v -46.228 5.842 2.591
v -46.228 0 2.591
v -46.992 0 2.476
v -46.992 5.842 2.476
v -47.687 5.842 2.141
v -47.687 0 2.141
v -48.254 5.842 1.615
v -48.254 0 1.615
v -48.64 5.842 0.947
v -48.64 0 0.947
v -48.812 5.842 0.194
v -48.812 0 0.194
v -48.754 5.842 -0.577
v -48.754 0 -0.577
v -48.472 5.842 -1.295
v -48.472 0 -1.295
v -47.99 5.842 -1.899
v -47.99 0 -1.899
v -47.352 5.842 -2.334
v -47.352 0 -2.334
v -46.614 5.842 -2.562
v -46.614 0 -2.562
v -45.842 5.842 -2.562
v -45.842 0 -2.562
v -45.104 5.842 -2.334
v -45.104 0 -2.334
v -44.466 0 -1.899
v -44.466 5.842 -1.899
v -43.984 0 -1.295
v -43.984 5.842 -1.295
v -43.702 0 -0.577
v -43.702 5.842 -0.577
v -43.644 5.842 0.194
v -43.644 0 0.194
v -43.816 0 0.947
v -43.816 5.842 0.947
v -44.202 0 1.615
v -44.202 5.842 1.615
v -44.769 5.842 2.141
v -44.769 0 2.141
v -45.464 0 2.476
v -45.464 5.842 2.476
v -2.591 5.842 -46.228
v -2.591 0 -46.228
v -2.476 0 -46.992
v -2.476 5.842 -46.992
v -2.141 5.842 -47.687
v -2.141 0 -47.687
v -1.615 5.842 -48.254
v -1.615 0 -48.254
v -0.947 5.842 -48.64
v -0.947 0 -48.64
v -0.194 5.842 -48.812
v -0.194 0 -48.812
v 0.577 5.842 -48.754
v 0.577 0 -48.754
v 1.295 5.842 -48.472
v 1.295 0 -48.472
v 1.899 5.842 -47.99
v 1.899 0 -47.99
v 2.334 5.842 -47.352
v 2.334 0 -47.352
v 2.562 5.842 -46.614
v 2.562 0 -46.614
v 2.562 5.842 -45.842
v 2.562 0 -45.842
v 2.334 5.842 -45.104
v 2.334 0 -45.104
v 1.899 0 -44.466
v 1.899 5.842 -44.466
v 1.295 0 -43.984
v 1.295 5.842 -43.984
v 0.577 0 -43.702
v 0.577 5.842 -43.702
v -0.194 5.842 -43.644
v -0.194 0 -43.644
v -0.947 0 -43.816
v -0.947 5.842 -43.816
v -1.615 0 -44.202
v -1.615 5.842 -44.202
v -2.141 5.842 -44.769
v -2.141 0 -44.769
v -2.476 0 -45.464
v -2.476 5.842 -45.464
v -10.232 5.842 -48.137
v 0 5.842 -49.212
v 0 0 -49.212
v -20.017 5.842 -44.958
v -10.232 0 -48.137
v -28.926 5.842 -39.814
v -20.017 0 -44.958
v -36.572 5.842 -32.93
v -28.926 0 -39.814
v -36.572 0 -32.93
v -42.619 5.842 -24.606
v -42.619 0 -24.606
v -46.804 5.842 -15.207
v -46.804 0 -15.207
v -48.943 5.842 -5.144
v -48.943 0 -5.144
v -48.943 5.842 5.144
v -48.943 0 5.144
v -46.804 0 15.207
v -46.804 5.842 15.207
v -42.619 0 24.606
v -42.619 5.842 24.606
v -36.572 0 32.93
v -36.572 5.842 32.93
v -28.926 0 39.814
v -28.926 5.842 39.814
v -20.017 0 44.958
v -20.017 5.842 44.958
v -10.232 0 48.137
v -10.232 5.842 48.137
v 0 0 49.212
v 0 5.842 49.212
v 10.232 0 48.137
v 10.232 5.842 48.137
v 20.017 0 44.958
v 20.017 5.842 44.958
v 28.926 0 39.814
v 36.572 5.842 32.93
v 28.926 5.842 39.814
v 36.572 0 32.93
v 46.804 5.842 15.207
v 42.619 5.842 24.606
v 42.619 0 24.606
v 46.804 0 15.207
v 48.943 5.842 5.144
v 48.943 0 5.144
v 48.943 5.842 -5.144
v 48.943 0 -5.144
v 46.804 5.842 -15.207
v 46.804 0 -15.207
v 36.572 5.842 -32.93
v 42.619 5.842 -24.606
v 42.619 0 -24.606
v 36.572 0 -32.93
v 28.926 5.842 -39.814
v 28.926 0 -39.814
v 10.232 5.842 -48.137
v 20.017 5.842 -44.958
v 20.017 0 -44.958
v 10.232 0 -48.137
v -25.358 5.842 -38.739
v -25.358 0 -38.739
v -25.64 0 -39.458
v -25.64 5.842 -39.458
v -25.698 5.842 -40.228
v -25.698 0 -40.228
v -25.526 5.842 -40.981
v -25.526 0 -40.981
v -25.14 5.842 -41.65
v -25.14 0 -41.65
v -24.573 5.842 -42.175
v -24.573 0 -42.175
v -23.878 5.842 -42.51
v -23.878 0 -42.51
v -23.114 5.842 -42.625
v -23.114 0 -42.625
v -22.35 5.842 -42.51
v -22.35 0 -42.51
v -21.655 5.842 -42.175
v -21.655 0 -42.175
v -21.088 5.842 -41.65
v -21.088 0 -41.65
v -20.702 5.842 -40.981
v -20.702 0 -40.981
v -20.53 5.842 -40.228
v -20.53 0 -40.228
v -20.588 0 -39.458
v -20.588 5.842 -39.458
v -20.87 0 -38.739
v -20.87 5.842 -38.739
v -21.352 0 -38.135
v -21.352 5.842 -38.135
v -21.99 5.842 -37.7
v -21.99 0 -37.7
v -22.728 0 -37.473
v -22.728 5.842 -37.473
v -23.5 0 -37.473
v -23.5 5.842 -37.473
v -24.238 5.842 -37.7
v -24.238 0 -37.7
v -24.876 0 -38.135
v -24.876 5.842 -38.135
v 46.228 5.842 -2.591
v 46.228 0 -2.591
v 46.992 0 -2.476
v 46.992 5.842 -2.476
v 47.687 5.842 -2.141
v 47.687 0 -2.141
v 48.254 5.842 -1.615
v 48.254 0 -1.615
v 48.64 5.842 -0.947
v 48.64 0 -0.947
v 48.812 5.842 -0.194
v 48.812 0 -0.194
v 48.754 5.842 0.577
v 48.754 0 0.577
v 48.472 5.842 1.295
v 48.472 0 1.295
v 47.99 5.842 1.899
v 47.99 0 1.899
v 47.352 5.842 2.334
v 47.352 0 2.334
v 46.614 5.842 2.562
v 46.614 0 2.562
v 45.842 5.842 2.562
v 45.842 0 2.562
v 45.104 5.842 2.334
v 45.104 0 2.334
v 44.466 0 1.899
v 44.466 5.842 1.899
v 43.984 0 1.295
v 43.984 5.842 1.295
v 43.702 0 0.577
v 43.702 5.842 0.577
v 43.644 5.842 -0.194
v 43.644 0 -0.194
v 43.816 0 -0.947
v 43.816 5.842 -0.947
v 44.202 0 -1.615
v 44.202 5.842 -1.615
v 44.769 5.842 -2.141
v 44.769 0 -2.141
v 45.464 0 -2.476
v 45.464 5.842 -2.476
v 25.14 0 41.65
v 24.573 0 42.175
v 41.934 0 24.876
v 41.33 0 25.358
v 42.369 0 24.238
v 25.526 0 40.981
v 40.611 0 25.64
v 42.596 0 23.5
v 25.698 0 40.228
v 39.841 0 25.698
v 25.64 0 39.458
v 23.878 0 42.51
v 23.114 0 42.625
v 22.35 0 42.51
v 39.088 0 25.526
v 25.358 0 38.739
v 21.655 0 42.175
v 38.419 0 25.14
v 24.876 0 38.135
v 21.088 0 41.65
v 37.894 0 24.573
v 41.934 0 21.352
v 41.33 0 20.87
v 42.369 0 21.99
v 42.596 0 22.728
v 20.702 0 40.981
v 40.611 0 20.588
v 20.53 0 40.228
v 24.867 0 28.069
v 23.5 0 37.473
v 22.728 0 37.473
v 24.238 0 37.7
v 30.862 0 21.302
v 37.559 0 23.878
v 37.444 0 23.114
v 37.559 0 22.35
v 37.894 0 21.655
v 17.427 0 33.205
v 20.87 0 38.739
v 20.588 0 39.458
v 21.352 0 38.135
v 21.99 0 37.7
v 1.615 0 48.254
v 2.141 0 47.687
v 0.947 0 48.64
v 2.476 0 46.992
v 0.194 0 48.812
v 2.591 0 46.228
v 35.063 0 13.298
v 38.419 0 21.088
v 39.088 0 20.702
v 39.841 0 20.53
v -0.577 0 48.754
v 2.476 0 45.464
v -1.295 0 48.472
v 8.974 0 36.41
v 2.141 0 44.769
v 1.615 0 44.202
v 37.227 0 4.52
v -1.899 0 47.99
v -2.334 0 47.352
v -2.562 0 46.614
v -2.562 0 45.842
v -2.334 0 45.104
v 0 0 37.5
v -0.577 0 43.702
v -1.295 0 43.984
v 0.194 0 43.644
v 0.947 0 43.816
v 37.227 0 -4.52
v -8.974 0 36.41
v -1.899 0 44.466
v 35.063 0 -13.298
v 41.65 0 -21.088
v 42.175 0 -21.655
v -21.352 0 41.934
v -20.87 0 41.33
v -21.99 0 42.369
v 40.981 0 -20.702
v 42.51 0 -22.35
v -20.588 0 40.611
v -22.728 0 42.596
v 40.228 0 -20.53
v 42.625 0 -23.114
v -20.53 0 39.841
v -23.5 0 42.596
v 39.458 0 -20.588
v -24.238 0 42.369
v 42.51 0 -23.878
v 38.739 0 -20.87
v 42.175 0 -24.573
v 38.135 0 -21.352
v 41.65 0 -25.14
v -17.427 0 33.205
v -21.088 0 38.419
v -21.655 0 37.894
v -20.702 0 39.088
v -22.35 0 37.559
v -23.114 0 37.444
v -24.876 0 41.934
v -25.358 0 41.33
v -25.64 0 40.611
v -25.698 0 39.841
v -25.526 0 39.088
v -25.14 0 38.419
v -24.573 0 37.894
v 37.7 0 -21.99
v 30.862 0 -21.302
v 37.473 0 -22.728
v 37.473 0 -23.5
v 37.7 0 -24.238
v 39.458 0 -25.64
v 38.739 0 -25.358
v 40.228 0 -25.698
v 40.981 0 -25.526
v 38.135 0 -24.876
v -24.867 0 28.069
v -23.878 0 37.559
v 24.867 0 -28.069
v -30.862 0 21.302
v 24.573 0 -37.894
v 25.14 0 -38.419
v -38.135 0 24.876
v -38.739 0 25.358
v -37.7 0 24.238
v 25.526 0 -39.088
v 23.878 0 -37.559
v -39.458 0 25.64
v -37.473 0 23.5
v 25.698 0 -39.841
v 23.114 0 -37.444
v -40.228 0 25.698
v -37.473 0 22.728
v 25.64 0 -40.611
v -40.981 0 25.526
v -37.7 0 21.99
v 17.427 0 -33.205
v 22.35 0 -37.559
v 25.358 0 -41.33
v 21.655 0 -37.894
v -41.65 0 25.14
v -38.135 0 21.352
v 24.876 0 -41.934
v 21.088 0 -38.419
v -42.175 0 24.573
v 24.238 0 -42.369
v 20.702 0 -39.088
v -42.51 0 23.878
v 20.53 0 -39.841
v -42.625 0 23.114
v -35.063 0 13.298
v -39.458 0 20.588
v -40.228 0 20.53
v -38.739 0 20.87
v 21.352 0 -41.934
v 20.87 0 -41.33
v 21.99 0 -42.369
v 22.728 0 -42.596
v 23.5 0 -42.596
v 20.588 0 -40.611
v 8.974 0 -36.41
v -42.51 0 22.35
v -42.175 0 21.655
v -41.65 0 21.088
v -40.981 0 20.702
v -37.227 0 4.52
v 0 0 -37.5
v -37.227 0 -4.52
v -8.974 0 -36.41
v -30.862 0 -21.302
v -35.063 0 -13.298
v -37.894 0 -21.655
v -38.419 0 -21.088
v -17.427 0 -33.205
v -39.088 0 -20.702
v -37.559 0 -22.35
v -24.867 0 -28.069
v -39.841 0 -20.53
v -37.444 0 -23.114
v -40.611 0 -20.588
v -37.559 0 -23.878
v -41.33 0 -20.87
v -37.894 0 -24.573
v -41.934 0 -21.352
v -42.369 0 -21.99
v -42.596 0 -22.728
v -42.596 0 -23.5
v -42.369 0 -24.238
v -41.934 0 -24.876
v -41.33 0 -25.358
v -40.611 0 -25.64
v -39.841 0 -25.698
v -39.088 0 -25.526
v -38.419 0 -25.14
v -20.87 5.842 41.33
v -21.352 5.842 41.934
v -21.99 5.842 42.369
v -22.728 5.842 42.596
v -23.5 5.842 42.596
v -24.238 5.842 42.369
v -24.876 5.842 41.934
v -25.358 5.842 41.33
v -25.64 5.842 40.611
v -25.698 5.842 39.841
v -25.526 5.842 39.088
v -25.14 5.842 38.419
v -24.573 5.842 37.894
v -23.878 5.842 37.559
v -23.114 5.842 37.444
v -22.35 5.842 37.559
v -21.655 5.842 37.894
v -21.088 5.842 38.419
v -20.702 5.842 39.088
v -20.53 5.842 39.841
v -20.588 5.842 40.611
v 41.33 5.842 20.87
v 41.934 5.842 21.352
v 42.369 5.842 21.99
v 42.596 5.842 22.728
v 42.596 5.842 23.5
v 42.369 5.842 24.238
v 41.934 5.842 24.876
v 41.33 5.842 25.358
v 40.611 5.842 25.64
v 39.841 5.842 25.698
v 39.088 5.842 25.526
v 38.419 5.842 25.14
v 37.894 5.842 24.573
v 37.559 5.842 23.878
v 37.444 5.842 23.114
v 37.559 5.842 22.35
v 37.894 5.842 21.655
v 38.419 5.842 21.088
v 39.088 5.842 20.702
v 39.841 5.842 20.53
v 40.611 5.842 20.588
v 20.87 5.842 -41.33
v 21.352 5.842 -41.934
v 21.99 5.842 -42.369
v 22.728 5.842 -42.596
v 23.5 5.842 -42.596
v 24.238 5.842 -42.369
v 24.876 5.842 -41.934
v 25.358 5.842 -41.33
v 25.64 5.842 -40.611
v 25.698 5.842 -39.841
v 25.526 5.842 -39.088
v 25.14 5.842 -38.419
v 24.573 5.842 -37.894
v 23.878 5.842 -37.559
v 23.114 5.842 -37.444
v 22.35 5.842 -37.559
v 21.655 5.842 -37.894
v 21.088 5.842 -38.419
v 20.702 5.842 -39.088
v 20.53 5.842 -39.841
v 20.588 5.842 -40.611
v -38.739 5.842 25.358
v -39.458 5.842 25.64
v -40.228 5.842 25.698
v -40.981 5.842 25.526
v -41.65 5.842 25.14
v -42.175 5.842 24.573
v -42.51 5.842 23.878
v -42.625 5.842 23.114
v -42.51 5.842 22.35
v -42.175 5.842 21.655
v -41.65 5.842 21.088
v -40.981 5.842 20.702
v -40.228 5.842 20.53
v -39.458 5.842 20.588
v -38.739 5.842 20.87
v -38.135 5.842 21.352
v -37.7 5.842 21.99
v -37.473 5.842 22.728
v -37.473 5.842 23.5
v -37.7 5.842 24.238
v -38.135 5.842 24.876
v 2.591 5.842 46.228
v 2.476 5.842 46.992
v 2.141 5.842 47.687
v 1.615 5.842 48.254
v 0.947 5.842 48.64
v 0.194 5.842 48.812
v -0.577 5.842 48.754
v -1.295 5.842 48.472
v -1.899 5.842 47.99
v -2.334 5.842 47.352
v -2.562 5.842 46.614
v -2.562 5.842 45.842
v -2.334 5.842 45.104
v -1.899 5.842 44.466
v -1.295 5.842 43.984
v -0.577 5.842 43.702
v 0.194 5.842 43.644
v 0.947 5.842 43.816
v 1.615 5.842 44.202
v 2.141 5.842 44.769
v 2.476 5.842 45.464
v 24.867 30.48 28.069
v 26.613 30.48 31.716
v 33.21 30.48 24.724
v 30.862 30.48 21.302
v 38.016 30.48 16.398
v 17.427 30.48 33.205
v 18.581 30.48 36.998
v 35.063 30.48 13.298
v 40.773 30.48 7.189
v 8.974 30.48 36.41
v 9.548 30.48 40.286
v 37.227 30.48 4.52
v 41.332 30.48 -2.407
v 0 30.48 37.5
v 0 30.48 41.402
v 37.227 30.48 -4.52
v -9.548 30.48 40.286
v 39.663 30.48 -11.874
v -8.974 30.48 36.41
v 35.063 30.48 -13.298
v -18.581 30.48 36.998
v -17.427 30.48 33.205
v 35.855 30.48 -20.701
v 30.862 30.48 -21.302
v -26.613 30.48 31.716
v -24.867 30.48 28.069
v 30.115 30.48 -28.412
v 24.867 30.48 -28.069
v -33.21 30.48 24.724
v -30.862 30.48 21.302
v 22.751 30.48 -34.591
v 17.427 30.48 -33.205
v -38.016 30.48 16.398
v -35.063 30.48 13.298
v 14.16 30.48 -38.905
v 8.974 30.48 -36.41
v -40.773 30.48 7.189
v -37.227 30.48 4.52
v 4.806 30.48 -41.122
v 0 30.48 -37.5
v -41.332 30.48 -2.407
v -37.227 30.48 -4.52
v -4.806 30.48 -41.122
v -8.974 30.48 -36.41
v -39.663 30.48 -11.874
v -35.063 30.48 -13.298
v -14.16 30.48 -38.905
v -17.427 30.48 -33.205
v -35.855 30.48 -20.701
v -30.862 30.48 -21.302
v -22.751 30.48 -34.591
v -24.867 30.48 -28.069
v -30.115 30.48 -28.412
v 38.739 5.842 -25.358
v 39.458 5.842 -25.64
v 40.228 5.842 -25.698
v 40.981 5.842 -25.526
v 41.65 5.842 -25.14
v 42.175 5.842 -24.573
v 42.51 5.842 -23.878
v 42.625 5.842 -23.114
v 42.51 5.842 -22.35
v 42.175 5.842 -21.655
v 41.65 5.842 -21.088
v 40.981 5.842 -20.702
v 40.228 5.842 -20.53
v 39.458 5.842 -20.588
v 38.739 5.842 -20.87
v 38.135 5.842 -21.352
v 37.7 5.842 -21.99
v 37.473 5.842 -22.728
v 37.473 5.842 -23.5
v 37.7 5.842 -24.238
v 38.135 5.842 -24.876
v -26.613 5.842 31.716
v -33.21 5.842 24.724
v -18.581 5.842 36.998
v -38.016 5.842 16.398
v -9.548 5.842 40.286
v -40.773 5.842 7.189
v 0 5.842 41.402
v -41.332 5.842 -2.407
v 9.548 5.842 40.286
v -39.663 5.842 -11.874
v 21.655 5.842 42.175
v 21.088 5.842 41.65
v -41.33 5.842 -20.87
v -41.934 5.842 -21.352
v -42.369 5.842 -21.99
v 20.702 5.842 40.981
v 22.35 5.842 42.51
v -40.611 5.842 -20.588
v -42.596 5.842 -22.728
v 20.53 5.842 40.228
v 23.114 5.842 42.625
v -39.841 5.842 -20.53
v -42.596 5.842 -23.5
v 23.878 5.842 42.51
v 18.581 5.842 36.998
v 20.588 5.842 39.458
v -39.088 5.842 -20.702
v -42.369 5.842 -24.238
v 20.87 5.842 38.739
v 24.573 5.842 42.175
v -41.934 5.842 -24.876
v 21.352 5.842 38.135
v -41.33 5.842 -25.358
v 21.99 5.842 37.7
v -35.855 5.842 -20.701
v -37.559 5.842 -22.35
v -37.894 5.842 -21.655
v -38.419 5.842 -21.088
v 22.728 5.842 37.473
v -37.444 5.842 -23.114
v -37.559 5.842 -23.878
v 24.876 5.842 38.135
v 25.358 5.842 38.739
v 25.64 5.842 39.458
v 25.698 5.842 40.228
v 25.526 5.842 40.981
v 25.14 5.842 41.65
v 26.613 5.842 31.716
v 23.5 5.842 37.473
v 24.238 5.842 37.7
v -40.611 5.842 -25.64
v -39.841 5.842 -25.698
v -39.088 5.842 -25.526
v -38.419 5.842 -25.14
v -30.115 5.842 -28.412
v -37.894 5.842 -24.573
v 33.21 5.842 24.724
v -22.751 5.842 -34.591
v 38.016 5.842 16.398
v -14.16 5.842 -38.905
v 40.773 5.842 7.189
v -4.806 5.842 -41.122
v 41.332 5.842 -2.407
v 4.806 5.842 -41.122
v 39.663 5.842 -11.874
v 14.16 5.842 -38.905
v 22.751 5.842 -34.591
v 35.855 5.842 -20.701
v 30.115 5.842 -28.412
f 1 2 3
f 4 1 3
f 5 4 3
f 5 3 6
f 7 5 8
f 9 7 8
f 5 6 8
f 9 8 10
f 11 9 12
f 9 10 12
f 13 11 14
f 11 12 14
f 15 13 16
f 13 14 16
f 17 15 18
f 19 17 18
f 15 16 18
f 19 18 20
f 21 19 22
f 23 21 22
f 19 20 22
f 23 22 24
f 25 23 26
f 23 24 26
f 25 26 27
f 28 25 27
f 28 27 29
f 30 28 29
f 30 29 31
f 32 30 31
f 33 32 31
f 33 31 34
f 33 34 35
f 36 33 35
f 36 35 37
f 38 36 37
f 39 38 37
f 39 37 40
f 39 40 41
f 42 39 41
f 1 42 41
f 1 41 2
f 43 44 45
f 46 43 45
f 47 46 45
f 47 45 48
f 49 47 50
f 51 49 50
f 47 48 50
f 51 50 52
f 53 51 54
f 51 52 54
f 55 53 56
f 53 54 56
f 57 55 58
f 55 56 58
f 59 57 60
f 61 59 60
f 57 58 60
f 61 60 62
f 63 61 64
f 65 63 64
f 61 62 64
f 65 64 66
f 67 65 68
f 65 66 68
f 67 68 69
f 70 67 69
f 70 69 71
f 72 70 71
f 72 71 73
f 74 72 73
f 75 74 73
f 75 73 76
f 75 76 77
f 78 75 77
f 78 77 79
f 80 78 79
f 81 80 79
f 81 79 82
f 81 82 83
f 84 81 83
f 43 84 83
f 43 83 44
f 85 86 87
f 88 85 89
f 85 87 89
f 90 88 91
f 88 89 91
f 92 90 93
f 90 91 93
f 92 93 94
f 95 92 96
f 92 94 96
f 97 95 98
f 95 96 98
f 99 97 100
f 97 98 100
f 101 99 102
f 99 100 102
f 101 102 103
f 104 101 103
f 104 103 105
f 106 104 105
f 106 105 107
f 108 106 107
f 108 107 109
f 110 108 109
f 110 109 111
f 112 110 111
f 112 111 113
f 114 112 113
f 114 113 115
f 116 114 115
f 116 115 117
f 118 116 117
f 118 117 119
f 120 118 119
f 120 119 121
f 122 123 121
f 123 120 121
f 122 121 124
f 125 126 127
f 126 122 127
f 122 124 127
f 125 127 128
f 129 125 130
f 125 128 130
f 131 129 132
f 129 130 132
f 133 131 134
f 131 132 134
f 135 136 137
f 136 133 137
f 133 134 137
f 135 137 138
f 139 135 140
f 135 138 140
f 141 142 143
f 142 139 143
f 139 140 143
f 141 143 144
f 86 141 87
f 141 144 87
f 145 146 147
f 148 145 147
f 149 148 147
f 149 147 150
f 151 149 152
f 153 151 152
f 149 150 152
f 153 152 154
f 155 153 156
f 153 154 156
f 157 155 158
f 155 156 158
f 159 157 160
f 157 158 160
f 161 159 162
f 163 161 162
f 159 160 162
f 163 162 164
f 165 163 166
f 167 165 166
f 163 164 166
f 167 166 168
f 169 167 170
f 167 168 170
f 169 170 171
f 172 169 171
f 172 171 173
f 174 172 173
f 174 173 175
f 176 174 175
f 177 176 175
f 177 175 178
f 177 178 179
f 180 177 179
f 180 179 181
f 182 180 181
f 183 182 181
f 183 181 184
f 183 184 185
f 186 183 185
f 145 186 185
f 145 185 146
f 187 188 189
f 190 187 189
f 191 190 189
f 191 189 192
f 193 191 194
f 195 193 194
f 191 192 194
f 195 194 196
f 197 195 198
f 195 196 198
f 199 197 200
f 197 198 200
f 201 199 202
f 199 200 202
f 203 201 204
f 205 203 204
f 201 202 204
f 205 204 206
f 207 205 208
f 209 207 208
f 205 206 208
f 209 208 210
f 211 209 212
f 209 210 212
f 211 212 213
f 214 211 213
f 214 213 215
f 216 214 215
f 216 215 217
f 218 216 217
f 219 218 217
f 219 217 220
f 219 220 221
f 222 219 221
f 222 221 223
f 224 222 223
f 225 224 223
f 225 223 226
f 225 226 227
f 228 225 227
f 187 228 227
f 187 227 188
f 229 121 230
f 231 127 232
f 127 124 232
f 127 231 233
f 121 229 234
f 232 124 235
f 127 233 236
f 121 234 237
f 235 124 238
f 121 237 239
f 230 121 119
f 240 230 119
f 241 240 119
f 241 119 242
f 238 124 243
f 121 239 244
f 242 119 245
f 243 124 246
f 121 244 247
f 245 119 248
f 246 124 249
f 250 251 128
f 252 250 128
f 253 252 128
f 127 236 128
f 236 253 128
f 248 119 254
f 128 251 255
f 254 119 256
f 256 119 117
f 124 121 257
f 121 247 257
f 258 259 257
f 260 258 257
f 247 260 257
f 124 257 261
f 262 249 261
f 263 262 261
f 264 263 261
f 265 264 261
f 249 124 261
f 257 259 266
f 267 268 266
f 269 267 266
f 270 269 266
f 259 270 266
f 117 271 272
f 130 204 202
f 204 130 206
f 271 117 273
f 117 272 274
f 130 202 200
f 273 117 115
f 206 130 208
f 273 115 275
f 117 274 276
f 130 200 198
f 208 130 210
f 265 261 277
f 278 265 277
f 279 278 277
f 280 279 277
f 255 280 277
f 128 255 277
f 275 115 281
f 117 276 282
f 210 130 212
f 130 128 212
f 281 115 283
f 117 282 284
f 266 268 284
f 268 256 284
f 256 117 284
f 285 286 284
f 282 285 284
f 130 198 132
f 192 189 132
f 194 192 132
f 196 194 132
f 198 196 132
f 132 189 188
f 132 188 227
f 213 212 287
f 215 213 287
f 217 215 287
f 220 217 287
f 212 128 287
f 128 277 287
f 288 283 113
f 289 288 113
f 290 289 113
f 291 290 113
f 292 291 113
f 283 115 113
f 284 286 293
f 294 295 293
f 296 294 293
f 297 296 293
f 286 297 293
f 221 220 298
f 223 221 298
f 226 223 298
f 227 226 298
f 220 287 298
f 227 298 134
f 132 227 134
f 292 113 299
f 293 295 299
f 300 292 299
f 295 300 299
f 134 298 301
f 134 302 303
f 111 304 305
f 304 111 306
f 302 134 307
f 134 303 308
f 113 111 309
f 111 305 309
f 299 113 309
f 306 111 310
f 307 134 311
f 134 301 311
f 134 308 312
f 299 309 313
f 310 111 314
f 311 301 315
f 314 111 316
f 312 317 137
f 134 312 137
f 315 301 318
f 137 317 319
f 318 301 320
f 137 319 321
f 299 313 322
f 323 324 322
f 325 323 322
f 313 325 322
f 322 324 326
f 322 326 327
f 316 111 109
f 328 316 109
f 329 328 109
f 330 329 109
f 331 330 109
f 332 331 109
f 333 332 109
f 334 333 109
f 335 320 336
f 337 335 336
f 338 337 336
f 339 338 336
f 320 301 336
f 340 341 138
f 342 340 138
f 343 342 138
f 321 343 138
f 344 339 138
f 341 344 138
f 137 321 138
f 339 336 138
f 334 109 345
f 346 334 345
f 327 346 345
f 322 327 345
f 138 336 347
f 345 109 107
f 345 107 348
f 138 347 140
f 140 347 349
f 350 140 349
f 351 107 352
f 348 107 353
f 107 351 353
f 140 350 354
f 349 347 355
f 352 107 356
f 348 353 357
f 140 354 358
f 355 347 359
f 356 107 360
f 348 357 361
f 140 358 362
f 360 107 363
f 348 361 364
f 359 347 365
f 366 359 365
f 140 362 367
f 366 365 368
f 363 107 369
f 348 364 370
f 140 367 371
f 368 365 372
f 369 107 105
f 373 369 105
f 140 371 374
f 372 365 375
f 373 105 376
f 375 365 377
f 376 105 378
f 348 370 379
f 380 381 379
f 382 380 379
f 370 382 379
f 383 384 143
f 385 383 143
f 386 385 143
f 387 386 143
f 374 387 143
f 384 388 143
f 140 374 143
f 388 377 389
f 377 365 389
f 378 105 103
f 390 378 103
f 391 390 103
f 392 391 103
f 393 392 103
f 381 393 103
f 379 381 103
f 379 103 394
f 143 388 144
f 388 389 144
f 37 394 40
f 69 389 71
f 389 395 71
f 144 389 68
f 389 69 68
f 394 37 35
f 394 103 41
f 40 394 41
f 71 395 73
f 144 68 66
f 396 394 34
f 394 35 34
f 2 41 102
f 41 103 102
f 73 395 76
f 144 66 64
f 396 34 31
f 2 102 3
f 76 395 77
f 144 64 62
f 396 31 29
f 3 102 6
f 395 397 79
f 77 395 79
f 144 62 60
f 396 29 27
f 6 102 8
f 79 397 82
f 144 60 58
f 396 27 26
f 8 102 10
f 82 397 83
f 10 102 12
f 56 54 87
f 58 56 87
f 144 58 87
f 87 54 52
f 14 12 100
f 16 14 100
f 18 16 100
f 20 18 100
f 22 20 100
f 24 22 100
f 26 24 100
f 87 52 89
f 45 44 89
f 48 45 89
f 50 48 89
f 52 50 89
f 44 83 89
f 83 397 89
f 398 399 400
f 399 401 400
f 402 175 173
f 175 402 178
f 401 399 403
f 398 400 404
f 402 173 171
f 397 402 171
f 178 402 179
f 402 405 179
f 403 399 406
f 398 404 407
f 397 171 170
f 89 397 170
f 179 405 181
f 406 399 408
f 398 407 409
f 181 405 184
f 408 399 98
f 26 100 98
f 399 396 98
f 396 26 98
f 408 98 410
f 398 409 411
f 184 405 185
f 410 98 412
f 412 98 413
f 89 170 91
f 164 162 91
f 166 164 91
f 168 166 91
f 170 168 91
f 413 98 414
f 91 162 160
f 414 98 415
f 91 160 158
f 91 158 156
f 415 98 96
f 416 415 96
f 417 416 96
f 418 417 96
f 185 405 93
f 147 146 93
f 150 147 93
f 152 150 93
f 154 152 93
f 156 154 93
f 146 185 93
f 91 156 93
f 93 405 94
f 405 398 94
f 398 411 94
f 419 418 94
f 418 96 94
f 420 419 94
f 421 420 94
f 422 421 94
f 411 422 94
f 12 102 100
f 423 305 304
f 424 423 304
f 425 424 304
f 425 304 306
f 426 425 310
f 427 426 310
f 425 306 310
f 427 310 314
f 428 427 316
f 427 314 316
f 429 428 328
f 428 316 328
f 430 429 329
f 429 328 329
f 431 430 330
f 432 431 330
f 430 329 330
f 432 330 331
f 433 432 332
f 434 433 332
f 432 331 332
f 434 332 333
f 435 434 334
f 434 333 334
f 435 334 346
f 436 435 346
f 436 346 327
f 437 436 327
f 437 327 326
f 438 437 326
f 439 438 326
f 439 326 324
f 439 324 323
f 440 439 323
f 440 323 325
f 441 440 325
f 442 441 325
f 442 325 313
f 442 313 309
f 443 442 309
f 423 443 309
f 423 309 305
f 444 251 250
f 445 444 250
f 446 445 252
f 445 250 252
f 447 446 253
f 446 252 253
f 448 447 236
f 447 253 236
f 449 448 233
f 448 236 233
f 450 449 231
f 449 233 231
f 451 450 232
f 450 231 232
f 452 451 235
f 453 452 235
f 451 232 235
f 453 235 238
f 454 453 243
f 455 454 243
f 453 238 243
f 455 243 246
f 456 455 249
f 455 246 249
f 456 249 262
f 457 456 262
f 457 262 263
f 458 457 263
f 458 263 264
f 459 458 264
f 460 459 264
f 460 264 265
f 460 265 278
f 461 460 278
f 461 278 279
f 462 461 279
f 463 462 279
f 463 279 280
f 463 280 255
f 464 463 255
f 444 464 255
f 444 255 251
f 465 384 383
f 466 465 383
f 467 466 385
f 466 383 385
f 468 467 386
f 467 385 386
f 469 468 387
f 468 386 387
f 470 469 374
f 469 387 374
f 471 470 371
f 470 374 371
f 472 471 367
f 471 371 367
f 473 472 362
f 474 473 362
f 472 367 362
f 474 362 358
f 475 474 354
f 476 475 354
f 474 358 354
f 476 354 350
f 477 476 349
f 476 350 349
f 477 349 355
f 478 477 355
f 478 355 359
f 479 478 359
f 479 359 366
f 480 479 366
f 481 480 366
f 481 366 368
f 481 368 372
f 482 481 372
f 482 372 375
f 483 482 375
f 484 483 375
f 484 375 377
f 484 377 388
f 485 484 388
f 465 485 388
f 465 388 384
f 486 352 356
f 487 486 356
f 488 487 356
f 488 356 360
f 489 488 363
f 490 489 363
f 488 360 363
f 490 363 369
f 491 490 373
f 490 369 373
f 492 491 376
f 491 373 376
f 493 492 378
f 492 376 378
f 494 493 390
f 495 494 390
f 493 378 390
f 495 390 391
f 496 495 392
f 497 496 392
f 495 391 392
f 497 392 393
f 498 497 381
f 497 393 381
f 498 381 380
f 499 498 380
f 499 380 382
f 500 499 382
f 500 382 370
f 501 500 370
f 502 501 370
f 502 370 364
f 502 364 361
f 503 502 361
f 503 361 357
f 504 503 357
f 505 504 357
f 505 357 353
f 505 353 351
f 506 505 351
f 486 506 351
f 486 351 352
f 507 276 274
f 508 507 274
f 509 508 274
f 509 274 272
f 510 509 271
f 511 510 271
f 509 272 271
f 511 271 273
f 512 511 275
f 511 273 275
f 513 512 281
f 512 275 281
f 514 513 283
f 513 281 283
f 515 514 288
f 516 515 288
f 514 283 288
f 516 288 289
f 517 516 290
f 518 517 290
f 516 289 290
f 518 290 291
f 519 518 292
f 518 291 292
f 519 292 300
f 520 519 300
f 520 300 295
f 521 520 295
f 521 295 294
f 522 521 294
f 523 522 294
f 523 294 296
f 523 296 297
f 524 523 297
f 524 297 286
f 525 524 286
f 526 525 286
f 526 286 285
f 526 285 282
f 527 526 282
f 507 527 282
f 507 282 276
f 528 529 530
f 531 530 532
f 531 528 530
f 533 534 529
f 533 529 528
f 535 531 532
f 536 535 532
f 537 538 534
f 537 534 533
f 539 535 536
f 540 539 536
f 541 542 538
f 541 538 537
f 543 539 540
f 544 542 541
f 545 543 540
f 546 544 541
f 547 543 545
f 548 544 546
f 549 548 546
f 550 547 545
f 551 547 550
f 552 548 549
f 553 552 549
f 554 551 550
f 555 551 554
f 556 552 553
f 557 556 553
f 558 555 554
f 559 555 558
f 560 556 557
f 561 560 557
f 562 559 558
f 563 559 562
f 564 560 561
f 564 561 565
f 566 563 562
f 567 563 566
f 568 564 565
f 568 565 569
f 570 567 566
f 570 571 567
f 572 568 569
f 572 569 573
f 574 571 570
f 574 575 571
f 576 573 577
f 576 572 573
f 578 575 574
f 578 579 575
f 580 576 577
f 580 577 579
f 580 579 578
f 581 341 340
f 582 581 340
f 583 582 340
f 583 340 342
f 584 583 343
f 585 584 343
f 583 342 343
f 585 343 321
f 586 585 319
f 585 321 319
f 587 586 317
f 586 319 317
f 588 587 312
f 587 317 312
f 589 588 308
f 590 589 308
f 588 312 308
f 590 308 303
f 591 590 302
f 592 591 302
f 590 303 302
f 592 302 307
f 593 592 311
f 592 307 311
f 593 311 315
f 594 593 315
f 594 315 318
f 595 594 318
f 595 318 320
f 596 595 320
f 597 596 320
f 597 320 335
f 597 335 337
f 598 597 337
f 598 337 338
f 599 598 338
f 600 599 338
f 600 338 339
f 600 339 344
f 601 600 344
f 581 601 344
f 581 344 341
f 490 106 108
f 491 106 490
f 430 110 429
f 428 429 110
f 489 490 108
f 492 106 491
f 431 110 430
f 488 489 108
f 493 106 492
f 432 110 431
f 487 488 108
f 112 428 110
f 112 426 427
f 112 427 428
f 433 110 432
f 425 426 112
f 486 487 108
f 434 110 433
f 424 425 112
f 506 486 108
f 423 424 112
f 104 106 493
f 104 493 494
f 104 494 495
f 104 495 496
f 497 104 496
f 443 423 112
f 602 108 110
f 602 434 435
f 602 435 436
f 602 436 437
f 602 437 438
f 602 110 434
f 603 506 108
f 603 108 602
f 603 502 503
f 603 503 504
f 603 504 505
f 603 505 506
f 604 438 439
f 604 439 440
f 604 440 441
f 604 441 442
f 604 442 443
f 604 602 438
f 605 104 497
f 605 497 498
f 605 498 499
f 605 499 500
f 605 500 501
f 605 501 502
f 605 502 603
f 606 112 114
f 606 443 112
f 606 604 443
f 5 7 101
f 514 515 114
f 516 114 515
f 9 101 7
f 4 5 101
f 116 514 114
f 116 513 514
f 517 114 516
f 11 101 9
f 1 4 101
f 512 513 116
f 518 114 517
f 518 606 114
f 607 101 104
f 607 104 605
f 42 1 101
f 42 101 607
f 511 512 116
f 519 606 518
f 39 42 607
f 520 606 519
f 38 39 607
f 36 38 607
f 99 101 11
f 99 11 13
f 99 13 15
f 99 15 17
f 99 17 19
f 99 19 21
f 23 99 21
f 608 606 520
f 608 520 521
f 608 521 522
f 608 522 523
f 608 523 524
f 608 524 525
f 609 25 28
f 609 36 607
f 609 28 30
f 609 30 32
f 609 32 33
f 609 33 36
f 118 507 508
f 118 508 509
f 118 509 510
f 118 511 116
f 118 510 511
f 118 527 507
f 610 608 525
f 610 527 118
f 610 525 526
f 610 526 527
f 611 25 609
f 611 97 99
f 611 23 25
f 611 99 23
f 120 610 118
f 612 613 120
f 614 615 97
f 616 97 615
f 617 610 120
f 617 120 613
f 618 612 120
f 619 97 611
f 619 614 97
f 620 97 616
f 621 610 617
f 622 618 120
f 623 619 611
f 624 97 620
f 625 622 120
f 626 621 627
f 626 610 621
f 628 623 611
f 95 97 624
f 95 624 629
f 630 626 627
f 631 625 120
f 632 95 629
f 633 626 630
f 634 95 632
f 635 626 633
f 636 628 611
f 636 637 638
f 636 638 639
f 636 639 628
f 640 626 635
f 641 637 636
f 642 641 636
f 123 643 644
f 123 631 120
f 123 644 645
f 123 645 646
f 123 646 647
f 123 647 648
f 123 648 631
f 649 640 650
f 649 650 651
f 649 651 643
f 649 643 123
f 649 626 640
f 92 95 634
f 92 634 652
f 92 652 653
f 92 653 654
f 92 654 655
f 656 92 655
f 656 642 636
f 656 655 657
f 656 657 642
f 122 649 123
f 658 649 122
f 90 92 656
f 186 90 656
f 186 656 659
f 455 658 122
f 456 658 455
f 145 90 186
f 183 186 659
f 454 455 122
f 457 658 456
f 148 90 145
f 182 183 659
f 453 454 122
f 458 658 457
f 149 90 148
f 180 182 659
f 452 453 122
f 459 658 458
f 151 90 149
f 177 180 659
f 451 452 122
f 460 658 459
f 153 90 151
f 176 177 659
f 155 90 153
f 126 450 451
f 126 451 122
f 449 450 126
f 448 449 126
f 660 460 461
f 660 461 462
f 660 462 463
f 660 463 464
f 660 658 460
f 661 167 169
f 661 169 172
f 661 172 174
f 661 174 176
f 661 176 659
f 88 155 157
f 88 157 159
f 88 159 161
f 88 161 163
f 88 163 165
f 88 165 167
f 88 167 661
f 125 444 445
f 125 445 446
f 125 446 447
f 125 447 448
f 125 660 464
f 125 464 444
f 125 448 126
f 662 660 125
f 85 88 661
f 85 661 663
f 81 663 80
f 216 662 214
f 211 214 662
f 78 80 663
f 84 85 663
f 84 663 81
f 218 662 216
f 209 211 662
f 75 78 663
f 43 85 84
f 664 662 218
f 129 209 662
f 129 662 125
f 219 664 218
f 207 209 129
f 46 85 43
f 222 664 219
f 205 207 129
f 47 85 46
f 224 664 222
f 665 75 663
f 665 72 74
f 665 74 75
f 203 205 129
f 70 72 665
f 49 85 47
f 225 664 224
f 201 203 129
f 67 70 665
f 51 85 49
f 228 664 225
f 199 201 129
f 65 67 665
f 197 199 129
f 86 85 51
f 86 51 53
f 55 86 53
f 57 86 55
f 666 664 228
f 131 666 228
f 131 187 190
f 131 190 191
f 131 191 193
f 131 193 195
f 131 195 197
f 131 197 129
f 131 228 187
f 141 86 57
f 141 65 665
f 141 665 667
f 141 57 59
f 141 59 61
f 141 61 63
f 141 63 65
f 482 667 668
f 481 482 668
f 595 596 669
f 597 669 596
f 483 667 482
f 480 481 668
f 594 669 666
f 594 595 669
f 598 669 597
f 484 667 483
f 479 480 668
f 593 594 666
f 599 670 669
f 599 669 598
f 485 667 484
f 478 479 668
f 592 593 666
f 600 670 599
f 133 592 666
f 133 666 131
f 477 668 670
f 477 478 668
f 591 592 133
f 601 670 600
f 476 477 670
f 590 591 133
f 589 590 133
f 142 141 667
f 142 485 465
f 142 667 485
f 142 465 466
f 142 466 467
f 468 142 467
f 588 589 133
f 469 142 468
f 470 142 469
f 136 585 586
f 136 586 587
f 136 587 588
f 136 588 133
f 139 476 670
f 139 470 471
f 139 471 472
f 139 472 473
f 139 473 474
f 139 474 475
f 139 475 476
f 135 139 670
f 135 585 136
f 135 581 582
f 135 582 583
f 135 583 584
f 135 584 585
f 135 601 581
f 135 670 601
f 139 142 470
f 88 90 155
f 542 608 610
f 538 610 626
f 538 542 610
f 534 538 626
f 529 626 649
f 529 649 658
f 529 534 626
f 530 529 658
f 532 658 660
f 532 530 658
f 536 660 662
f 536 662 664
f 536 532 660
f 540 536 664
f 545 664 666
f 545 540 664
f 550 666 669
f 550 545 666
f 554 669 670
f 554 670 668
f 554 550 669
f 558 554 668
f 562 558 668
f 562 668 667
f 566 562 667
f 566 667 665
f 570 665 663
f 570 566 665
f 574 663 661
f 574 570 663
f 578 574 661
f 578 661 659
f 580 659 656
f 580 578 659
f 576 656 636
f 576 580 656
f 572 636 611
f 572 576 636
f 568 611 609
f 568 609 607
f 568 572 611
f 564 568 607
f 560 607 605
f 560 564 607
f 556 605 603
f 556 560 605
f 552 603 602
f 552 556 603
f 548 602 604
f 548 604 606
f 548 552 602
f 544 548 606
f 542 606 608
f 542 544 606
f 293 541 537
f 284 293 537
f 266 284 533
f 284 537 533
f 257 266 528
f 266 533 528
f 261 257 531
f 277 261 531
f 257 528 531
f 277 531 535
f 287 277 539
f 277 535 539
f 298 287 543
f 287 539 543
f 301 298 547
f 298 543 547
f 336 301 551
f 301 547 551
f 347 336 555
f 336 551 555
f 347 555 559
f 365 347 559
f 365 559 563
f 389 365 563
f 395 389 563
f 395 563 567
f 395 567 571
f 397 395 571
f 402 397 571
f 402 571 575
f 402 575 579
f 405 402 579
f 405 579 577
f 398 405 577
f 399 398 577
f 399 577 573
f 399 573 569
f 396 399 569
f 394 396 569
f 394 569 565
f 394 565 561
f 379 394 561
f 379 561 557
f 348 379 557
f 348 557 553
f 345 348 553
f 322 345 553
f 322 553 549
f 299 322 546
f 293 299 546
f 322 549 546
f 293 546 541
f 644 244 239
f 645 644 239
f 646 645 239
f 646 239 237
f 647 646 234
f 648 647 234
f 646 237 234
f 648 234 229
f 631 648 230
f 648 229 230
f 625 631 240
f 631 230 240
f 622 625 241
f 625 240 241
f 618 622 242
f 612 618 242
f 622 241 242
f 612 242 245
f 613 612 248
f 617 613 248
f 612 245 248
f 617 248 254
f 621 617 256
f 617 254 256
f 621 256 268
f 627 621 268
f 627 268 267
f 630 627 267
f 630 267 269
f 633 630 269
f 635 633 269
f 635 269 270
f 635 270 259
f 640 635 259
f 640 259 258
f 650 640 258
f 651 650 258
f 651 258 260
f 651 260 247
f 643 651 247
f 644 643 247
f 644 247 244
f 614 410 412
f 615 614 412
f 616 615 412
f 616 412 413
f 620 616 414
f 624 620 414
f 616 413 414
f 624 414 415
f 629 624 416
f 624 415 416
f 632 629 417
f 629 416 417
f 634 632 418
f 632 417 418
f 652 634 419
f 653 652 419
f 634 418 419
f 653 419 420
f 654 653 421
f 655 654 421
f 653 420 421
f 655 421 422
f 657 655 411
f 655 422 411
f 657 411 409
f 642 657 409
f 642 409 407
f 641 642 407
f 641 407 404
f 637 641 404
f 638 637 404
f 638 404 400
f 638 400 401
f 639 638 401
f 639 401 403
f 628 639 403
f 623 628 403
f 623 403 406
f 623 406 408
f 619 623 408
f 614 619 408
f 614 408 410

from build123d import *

# Parameters (mm, degrees)
SKETCH4_R                  = 49.2125
BOSS_EXTRUDE2_DEPTH        = 30.48
SKETCH5_OUTSIDE_W          = 128.922
SKETCH5_OUTSIDE_H          = 128.922
SKETCH5_OUTSIDE_R          = 41.402
CUT_EXTRUDE3_DEPTH         = 24.638
SKETCH6_R                  = 37.5
CUT_EXTRUDE4_DEPTH         = 76.978751717
F_6_0_204_DIAMETER_HOLE2_D = 5.1816
CIRPATTERN5_COUNT          = 12


with BuildPart() as part:
    # Sketch4 → Boss-Extrude2 (new body)
    with BuildSketch(Plane(origin=(0, 0, 0), x_dir=(1, 0, 0), z_dir=(0, 1, 0))):
        with Locations(Location((0, 0, 0), (0, 0, 90))):
            Circle(SKETCH4_R)
    extrude(amount=BOSS_EXTRUDE2_DEPTH)

    # Sketch5 outside → Cut-Extrude3 (cut)
    with BuildSketch(Plane(origin=(0, 30.48, 0), x_dir=(1, 0, 0), z_dir=(0, 1, 0))):
        Rectangle(SKETCH5_OUTSIDE_W, SKETCH5_OUTSIDE_H)
        with Locations(Location((0, 0, 0), (0, 0, 270))):
            Circle(SKETCH5_OUTSIDE_R, mode=Mode.SUBTRACT)
    extrude(amount=-CUT_EXTRUDE3_DEPTH, mode=Mode.SUBTRACT)

    # Sketch6 → Cut-Extrude4 (cut, through all)
    with BuildSketch(Plane(origin=(0, 30.48, 0), x_dir=(1, 0, 0), z_dir=(0, 1, 0))):
        with Locations(Location((0, 0, 0), (0, 0, 270))):
            Circle(SKETCH6_R)
    extrude(amount=-CUT_EXTRUDE4_DEPTH, mode=Mode.SUBTRACT)

    # #6 (0.204) Diameter Hole2 (through all)
    with Locations(Plane(origin=(0, 5.842, 0), x_dir=(1, 0, 0), z_dir=(0, 1, 0))):
        with Locations((0, 46.228)):
            f_6_0_204_diameter_hole2 = Hole(F_6_0_204_DIAMETER_HOLE2_D / 2)

    # CirPattern5: #6 (0.204) Diameter Hole2 ×12 about axis
    cirpattern5_axis = Axis((0, 0, 0), (0, 1, 0))
    for i in range(1, CIRPATTERN5_COUNT):
        add(f_6_0_204_diameter_hole2.rotate(cirpattern5_axis, i * 360 / CIRPATTERN5_COUNT), mode=Mode.SUBTRACT)


solid = part.part
